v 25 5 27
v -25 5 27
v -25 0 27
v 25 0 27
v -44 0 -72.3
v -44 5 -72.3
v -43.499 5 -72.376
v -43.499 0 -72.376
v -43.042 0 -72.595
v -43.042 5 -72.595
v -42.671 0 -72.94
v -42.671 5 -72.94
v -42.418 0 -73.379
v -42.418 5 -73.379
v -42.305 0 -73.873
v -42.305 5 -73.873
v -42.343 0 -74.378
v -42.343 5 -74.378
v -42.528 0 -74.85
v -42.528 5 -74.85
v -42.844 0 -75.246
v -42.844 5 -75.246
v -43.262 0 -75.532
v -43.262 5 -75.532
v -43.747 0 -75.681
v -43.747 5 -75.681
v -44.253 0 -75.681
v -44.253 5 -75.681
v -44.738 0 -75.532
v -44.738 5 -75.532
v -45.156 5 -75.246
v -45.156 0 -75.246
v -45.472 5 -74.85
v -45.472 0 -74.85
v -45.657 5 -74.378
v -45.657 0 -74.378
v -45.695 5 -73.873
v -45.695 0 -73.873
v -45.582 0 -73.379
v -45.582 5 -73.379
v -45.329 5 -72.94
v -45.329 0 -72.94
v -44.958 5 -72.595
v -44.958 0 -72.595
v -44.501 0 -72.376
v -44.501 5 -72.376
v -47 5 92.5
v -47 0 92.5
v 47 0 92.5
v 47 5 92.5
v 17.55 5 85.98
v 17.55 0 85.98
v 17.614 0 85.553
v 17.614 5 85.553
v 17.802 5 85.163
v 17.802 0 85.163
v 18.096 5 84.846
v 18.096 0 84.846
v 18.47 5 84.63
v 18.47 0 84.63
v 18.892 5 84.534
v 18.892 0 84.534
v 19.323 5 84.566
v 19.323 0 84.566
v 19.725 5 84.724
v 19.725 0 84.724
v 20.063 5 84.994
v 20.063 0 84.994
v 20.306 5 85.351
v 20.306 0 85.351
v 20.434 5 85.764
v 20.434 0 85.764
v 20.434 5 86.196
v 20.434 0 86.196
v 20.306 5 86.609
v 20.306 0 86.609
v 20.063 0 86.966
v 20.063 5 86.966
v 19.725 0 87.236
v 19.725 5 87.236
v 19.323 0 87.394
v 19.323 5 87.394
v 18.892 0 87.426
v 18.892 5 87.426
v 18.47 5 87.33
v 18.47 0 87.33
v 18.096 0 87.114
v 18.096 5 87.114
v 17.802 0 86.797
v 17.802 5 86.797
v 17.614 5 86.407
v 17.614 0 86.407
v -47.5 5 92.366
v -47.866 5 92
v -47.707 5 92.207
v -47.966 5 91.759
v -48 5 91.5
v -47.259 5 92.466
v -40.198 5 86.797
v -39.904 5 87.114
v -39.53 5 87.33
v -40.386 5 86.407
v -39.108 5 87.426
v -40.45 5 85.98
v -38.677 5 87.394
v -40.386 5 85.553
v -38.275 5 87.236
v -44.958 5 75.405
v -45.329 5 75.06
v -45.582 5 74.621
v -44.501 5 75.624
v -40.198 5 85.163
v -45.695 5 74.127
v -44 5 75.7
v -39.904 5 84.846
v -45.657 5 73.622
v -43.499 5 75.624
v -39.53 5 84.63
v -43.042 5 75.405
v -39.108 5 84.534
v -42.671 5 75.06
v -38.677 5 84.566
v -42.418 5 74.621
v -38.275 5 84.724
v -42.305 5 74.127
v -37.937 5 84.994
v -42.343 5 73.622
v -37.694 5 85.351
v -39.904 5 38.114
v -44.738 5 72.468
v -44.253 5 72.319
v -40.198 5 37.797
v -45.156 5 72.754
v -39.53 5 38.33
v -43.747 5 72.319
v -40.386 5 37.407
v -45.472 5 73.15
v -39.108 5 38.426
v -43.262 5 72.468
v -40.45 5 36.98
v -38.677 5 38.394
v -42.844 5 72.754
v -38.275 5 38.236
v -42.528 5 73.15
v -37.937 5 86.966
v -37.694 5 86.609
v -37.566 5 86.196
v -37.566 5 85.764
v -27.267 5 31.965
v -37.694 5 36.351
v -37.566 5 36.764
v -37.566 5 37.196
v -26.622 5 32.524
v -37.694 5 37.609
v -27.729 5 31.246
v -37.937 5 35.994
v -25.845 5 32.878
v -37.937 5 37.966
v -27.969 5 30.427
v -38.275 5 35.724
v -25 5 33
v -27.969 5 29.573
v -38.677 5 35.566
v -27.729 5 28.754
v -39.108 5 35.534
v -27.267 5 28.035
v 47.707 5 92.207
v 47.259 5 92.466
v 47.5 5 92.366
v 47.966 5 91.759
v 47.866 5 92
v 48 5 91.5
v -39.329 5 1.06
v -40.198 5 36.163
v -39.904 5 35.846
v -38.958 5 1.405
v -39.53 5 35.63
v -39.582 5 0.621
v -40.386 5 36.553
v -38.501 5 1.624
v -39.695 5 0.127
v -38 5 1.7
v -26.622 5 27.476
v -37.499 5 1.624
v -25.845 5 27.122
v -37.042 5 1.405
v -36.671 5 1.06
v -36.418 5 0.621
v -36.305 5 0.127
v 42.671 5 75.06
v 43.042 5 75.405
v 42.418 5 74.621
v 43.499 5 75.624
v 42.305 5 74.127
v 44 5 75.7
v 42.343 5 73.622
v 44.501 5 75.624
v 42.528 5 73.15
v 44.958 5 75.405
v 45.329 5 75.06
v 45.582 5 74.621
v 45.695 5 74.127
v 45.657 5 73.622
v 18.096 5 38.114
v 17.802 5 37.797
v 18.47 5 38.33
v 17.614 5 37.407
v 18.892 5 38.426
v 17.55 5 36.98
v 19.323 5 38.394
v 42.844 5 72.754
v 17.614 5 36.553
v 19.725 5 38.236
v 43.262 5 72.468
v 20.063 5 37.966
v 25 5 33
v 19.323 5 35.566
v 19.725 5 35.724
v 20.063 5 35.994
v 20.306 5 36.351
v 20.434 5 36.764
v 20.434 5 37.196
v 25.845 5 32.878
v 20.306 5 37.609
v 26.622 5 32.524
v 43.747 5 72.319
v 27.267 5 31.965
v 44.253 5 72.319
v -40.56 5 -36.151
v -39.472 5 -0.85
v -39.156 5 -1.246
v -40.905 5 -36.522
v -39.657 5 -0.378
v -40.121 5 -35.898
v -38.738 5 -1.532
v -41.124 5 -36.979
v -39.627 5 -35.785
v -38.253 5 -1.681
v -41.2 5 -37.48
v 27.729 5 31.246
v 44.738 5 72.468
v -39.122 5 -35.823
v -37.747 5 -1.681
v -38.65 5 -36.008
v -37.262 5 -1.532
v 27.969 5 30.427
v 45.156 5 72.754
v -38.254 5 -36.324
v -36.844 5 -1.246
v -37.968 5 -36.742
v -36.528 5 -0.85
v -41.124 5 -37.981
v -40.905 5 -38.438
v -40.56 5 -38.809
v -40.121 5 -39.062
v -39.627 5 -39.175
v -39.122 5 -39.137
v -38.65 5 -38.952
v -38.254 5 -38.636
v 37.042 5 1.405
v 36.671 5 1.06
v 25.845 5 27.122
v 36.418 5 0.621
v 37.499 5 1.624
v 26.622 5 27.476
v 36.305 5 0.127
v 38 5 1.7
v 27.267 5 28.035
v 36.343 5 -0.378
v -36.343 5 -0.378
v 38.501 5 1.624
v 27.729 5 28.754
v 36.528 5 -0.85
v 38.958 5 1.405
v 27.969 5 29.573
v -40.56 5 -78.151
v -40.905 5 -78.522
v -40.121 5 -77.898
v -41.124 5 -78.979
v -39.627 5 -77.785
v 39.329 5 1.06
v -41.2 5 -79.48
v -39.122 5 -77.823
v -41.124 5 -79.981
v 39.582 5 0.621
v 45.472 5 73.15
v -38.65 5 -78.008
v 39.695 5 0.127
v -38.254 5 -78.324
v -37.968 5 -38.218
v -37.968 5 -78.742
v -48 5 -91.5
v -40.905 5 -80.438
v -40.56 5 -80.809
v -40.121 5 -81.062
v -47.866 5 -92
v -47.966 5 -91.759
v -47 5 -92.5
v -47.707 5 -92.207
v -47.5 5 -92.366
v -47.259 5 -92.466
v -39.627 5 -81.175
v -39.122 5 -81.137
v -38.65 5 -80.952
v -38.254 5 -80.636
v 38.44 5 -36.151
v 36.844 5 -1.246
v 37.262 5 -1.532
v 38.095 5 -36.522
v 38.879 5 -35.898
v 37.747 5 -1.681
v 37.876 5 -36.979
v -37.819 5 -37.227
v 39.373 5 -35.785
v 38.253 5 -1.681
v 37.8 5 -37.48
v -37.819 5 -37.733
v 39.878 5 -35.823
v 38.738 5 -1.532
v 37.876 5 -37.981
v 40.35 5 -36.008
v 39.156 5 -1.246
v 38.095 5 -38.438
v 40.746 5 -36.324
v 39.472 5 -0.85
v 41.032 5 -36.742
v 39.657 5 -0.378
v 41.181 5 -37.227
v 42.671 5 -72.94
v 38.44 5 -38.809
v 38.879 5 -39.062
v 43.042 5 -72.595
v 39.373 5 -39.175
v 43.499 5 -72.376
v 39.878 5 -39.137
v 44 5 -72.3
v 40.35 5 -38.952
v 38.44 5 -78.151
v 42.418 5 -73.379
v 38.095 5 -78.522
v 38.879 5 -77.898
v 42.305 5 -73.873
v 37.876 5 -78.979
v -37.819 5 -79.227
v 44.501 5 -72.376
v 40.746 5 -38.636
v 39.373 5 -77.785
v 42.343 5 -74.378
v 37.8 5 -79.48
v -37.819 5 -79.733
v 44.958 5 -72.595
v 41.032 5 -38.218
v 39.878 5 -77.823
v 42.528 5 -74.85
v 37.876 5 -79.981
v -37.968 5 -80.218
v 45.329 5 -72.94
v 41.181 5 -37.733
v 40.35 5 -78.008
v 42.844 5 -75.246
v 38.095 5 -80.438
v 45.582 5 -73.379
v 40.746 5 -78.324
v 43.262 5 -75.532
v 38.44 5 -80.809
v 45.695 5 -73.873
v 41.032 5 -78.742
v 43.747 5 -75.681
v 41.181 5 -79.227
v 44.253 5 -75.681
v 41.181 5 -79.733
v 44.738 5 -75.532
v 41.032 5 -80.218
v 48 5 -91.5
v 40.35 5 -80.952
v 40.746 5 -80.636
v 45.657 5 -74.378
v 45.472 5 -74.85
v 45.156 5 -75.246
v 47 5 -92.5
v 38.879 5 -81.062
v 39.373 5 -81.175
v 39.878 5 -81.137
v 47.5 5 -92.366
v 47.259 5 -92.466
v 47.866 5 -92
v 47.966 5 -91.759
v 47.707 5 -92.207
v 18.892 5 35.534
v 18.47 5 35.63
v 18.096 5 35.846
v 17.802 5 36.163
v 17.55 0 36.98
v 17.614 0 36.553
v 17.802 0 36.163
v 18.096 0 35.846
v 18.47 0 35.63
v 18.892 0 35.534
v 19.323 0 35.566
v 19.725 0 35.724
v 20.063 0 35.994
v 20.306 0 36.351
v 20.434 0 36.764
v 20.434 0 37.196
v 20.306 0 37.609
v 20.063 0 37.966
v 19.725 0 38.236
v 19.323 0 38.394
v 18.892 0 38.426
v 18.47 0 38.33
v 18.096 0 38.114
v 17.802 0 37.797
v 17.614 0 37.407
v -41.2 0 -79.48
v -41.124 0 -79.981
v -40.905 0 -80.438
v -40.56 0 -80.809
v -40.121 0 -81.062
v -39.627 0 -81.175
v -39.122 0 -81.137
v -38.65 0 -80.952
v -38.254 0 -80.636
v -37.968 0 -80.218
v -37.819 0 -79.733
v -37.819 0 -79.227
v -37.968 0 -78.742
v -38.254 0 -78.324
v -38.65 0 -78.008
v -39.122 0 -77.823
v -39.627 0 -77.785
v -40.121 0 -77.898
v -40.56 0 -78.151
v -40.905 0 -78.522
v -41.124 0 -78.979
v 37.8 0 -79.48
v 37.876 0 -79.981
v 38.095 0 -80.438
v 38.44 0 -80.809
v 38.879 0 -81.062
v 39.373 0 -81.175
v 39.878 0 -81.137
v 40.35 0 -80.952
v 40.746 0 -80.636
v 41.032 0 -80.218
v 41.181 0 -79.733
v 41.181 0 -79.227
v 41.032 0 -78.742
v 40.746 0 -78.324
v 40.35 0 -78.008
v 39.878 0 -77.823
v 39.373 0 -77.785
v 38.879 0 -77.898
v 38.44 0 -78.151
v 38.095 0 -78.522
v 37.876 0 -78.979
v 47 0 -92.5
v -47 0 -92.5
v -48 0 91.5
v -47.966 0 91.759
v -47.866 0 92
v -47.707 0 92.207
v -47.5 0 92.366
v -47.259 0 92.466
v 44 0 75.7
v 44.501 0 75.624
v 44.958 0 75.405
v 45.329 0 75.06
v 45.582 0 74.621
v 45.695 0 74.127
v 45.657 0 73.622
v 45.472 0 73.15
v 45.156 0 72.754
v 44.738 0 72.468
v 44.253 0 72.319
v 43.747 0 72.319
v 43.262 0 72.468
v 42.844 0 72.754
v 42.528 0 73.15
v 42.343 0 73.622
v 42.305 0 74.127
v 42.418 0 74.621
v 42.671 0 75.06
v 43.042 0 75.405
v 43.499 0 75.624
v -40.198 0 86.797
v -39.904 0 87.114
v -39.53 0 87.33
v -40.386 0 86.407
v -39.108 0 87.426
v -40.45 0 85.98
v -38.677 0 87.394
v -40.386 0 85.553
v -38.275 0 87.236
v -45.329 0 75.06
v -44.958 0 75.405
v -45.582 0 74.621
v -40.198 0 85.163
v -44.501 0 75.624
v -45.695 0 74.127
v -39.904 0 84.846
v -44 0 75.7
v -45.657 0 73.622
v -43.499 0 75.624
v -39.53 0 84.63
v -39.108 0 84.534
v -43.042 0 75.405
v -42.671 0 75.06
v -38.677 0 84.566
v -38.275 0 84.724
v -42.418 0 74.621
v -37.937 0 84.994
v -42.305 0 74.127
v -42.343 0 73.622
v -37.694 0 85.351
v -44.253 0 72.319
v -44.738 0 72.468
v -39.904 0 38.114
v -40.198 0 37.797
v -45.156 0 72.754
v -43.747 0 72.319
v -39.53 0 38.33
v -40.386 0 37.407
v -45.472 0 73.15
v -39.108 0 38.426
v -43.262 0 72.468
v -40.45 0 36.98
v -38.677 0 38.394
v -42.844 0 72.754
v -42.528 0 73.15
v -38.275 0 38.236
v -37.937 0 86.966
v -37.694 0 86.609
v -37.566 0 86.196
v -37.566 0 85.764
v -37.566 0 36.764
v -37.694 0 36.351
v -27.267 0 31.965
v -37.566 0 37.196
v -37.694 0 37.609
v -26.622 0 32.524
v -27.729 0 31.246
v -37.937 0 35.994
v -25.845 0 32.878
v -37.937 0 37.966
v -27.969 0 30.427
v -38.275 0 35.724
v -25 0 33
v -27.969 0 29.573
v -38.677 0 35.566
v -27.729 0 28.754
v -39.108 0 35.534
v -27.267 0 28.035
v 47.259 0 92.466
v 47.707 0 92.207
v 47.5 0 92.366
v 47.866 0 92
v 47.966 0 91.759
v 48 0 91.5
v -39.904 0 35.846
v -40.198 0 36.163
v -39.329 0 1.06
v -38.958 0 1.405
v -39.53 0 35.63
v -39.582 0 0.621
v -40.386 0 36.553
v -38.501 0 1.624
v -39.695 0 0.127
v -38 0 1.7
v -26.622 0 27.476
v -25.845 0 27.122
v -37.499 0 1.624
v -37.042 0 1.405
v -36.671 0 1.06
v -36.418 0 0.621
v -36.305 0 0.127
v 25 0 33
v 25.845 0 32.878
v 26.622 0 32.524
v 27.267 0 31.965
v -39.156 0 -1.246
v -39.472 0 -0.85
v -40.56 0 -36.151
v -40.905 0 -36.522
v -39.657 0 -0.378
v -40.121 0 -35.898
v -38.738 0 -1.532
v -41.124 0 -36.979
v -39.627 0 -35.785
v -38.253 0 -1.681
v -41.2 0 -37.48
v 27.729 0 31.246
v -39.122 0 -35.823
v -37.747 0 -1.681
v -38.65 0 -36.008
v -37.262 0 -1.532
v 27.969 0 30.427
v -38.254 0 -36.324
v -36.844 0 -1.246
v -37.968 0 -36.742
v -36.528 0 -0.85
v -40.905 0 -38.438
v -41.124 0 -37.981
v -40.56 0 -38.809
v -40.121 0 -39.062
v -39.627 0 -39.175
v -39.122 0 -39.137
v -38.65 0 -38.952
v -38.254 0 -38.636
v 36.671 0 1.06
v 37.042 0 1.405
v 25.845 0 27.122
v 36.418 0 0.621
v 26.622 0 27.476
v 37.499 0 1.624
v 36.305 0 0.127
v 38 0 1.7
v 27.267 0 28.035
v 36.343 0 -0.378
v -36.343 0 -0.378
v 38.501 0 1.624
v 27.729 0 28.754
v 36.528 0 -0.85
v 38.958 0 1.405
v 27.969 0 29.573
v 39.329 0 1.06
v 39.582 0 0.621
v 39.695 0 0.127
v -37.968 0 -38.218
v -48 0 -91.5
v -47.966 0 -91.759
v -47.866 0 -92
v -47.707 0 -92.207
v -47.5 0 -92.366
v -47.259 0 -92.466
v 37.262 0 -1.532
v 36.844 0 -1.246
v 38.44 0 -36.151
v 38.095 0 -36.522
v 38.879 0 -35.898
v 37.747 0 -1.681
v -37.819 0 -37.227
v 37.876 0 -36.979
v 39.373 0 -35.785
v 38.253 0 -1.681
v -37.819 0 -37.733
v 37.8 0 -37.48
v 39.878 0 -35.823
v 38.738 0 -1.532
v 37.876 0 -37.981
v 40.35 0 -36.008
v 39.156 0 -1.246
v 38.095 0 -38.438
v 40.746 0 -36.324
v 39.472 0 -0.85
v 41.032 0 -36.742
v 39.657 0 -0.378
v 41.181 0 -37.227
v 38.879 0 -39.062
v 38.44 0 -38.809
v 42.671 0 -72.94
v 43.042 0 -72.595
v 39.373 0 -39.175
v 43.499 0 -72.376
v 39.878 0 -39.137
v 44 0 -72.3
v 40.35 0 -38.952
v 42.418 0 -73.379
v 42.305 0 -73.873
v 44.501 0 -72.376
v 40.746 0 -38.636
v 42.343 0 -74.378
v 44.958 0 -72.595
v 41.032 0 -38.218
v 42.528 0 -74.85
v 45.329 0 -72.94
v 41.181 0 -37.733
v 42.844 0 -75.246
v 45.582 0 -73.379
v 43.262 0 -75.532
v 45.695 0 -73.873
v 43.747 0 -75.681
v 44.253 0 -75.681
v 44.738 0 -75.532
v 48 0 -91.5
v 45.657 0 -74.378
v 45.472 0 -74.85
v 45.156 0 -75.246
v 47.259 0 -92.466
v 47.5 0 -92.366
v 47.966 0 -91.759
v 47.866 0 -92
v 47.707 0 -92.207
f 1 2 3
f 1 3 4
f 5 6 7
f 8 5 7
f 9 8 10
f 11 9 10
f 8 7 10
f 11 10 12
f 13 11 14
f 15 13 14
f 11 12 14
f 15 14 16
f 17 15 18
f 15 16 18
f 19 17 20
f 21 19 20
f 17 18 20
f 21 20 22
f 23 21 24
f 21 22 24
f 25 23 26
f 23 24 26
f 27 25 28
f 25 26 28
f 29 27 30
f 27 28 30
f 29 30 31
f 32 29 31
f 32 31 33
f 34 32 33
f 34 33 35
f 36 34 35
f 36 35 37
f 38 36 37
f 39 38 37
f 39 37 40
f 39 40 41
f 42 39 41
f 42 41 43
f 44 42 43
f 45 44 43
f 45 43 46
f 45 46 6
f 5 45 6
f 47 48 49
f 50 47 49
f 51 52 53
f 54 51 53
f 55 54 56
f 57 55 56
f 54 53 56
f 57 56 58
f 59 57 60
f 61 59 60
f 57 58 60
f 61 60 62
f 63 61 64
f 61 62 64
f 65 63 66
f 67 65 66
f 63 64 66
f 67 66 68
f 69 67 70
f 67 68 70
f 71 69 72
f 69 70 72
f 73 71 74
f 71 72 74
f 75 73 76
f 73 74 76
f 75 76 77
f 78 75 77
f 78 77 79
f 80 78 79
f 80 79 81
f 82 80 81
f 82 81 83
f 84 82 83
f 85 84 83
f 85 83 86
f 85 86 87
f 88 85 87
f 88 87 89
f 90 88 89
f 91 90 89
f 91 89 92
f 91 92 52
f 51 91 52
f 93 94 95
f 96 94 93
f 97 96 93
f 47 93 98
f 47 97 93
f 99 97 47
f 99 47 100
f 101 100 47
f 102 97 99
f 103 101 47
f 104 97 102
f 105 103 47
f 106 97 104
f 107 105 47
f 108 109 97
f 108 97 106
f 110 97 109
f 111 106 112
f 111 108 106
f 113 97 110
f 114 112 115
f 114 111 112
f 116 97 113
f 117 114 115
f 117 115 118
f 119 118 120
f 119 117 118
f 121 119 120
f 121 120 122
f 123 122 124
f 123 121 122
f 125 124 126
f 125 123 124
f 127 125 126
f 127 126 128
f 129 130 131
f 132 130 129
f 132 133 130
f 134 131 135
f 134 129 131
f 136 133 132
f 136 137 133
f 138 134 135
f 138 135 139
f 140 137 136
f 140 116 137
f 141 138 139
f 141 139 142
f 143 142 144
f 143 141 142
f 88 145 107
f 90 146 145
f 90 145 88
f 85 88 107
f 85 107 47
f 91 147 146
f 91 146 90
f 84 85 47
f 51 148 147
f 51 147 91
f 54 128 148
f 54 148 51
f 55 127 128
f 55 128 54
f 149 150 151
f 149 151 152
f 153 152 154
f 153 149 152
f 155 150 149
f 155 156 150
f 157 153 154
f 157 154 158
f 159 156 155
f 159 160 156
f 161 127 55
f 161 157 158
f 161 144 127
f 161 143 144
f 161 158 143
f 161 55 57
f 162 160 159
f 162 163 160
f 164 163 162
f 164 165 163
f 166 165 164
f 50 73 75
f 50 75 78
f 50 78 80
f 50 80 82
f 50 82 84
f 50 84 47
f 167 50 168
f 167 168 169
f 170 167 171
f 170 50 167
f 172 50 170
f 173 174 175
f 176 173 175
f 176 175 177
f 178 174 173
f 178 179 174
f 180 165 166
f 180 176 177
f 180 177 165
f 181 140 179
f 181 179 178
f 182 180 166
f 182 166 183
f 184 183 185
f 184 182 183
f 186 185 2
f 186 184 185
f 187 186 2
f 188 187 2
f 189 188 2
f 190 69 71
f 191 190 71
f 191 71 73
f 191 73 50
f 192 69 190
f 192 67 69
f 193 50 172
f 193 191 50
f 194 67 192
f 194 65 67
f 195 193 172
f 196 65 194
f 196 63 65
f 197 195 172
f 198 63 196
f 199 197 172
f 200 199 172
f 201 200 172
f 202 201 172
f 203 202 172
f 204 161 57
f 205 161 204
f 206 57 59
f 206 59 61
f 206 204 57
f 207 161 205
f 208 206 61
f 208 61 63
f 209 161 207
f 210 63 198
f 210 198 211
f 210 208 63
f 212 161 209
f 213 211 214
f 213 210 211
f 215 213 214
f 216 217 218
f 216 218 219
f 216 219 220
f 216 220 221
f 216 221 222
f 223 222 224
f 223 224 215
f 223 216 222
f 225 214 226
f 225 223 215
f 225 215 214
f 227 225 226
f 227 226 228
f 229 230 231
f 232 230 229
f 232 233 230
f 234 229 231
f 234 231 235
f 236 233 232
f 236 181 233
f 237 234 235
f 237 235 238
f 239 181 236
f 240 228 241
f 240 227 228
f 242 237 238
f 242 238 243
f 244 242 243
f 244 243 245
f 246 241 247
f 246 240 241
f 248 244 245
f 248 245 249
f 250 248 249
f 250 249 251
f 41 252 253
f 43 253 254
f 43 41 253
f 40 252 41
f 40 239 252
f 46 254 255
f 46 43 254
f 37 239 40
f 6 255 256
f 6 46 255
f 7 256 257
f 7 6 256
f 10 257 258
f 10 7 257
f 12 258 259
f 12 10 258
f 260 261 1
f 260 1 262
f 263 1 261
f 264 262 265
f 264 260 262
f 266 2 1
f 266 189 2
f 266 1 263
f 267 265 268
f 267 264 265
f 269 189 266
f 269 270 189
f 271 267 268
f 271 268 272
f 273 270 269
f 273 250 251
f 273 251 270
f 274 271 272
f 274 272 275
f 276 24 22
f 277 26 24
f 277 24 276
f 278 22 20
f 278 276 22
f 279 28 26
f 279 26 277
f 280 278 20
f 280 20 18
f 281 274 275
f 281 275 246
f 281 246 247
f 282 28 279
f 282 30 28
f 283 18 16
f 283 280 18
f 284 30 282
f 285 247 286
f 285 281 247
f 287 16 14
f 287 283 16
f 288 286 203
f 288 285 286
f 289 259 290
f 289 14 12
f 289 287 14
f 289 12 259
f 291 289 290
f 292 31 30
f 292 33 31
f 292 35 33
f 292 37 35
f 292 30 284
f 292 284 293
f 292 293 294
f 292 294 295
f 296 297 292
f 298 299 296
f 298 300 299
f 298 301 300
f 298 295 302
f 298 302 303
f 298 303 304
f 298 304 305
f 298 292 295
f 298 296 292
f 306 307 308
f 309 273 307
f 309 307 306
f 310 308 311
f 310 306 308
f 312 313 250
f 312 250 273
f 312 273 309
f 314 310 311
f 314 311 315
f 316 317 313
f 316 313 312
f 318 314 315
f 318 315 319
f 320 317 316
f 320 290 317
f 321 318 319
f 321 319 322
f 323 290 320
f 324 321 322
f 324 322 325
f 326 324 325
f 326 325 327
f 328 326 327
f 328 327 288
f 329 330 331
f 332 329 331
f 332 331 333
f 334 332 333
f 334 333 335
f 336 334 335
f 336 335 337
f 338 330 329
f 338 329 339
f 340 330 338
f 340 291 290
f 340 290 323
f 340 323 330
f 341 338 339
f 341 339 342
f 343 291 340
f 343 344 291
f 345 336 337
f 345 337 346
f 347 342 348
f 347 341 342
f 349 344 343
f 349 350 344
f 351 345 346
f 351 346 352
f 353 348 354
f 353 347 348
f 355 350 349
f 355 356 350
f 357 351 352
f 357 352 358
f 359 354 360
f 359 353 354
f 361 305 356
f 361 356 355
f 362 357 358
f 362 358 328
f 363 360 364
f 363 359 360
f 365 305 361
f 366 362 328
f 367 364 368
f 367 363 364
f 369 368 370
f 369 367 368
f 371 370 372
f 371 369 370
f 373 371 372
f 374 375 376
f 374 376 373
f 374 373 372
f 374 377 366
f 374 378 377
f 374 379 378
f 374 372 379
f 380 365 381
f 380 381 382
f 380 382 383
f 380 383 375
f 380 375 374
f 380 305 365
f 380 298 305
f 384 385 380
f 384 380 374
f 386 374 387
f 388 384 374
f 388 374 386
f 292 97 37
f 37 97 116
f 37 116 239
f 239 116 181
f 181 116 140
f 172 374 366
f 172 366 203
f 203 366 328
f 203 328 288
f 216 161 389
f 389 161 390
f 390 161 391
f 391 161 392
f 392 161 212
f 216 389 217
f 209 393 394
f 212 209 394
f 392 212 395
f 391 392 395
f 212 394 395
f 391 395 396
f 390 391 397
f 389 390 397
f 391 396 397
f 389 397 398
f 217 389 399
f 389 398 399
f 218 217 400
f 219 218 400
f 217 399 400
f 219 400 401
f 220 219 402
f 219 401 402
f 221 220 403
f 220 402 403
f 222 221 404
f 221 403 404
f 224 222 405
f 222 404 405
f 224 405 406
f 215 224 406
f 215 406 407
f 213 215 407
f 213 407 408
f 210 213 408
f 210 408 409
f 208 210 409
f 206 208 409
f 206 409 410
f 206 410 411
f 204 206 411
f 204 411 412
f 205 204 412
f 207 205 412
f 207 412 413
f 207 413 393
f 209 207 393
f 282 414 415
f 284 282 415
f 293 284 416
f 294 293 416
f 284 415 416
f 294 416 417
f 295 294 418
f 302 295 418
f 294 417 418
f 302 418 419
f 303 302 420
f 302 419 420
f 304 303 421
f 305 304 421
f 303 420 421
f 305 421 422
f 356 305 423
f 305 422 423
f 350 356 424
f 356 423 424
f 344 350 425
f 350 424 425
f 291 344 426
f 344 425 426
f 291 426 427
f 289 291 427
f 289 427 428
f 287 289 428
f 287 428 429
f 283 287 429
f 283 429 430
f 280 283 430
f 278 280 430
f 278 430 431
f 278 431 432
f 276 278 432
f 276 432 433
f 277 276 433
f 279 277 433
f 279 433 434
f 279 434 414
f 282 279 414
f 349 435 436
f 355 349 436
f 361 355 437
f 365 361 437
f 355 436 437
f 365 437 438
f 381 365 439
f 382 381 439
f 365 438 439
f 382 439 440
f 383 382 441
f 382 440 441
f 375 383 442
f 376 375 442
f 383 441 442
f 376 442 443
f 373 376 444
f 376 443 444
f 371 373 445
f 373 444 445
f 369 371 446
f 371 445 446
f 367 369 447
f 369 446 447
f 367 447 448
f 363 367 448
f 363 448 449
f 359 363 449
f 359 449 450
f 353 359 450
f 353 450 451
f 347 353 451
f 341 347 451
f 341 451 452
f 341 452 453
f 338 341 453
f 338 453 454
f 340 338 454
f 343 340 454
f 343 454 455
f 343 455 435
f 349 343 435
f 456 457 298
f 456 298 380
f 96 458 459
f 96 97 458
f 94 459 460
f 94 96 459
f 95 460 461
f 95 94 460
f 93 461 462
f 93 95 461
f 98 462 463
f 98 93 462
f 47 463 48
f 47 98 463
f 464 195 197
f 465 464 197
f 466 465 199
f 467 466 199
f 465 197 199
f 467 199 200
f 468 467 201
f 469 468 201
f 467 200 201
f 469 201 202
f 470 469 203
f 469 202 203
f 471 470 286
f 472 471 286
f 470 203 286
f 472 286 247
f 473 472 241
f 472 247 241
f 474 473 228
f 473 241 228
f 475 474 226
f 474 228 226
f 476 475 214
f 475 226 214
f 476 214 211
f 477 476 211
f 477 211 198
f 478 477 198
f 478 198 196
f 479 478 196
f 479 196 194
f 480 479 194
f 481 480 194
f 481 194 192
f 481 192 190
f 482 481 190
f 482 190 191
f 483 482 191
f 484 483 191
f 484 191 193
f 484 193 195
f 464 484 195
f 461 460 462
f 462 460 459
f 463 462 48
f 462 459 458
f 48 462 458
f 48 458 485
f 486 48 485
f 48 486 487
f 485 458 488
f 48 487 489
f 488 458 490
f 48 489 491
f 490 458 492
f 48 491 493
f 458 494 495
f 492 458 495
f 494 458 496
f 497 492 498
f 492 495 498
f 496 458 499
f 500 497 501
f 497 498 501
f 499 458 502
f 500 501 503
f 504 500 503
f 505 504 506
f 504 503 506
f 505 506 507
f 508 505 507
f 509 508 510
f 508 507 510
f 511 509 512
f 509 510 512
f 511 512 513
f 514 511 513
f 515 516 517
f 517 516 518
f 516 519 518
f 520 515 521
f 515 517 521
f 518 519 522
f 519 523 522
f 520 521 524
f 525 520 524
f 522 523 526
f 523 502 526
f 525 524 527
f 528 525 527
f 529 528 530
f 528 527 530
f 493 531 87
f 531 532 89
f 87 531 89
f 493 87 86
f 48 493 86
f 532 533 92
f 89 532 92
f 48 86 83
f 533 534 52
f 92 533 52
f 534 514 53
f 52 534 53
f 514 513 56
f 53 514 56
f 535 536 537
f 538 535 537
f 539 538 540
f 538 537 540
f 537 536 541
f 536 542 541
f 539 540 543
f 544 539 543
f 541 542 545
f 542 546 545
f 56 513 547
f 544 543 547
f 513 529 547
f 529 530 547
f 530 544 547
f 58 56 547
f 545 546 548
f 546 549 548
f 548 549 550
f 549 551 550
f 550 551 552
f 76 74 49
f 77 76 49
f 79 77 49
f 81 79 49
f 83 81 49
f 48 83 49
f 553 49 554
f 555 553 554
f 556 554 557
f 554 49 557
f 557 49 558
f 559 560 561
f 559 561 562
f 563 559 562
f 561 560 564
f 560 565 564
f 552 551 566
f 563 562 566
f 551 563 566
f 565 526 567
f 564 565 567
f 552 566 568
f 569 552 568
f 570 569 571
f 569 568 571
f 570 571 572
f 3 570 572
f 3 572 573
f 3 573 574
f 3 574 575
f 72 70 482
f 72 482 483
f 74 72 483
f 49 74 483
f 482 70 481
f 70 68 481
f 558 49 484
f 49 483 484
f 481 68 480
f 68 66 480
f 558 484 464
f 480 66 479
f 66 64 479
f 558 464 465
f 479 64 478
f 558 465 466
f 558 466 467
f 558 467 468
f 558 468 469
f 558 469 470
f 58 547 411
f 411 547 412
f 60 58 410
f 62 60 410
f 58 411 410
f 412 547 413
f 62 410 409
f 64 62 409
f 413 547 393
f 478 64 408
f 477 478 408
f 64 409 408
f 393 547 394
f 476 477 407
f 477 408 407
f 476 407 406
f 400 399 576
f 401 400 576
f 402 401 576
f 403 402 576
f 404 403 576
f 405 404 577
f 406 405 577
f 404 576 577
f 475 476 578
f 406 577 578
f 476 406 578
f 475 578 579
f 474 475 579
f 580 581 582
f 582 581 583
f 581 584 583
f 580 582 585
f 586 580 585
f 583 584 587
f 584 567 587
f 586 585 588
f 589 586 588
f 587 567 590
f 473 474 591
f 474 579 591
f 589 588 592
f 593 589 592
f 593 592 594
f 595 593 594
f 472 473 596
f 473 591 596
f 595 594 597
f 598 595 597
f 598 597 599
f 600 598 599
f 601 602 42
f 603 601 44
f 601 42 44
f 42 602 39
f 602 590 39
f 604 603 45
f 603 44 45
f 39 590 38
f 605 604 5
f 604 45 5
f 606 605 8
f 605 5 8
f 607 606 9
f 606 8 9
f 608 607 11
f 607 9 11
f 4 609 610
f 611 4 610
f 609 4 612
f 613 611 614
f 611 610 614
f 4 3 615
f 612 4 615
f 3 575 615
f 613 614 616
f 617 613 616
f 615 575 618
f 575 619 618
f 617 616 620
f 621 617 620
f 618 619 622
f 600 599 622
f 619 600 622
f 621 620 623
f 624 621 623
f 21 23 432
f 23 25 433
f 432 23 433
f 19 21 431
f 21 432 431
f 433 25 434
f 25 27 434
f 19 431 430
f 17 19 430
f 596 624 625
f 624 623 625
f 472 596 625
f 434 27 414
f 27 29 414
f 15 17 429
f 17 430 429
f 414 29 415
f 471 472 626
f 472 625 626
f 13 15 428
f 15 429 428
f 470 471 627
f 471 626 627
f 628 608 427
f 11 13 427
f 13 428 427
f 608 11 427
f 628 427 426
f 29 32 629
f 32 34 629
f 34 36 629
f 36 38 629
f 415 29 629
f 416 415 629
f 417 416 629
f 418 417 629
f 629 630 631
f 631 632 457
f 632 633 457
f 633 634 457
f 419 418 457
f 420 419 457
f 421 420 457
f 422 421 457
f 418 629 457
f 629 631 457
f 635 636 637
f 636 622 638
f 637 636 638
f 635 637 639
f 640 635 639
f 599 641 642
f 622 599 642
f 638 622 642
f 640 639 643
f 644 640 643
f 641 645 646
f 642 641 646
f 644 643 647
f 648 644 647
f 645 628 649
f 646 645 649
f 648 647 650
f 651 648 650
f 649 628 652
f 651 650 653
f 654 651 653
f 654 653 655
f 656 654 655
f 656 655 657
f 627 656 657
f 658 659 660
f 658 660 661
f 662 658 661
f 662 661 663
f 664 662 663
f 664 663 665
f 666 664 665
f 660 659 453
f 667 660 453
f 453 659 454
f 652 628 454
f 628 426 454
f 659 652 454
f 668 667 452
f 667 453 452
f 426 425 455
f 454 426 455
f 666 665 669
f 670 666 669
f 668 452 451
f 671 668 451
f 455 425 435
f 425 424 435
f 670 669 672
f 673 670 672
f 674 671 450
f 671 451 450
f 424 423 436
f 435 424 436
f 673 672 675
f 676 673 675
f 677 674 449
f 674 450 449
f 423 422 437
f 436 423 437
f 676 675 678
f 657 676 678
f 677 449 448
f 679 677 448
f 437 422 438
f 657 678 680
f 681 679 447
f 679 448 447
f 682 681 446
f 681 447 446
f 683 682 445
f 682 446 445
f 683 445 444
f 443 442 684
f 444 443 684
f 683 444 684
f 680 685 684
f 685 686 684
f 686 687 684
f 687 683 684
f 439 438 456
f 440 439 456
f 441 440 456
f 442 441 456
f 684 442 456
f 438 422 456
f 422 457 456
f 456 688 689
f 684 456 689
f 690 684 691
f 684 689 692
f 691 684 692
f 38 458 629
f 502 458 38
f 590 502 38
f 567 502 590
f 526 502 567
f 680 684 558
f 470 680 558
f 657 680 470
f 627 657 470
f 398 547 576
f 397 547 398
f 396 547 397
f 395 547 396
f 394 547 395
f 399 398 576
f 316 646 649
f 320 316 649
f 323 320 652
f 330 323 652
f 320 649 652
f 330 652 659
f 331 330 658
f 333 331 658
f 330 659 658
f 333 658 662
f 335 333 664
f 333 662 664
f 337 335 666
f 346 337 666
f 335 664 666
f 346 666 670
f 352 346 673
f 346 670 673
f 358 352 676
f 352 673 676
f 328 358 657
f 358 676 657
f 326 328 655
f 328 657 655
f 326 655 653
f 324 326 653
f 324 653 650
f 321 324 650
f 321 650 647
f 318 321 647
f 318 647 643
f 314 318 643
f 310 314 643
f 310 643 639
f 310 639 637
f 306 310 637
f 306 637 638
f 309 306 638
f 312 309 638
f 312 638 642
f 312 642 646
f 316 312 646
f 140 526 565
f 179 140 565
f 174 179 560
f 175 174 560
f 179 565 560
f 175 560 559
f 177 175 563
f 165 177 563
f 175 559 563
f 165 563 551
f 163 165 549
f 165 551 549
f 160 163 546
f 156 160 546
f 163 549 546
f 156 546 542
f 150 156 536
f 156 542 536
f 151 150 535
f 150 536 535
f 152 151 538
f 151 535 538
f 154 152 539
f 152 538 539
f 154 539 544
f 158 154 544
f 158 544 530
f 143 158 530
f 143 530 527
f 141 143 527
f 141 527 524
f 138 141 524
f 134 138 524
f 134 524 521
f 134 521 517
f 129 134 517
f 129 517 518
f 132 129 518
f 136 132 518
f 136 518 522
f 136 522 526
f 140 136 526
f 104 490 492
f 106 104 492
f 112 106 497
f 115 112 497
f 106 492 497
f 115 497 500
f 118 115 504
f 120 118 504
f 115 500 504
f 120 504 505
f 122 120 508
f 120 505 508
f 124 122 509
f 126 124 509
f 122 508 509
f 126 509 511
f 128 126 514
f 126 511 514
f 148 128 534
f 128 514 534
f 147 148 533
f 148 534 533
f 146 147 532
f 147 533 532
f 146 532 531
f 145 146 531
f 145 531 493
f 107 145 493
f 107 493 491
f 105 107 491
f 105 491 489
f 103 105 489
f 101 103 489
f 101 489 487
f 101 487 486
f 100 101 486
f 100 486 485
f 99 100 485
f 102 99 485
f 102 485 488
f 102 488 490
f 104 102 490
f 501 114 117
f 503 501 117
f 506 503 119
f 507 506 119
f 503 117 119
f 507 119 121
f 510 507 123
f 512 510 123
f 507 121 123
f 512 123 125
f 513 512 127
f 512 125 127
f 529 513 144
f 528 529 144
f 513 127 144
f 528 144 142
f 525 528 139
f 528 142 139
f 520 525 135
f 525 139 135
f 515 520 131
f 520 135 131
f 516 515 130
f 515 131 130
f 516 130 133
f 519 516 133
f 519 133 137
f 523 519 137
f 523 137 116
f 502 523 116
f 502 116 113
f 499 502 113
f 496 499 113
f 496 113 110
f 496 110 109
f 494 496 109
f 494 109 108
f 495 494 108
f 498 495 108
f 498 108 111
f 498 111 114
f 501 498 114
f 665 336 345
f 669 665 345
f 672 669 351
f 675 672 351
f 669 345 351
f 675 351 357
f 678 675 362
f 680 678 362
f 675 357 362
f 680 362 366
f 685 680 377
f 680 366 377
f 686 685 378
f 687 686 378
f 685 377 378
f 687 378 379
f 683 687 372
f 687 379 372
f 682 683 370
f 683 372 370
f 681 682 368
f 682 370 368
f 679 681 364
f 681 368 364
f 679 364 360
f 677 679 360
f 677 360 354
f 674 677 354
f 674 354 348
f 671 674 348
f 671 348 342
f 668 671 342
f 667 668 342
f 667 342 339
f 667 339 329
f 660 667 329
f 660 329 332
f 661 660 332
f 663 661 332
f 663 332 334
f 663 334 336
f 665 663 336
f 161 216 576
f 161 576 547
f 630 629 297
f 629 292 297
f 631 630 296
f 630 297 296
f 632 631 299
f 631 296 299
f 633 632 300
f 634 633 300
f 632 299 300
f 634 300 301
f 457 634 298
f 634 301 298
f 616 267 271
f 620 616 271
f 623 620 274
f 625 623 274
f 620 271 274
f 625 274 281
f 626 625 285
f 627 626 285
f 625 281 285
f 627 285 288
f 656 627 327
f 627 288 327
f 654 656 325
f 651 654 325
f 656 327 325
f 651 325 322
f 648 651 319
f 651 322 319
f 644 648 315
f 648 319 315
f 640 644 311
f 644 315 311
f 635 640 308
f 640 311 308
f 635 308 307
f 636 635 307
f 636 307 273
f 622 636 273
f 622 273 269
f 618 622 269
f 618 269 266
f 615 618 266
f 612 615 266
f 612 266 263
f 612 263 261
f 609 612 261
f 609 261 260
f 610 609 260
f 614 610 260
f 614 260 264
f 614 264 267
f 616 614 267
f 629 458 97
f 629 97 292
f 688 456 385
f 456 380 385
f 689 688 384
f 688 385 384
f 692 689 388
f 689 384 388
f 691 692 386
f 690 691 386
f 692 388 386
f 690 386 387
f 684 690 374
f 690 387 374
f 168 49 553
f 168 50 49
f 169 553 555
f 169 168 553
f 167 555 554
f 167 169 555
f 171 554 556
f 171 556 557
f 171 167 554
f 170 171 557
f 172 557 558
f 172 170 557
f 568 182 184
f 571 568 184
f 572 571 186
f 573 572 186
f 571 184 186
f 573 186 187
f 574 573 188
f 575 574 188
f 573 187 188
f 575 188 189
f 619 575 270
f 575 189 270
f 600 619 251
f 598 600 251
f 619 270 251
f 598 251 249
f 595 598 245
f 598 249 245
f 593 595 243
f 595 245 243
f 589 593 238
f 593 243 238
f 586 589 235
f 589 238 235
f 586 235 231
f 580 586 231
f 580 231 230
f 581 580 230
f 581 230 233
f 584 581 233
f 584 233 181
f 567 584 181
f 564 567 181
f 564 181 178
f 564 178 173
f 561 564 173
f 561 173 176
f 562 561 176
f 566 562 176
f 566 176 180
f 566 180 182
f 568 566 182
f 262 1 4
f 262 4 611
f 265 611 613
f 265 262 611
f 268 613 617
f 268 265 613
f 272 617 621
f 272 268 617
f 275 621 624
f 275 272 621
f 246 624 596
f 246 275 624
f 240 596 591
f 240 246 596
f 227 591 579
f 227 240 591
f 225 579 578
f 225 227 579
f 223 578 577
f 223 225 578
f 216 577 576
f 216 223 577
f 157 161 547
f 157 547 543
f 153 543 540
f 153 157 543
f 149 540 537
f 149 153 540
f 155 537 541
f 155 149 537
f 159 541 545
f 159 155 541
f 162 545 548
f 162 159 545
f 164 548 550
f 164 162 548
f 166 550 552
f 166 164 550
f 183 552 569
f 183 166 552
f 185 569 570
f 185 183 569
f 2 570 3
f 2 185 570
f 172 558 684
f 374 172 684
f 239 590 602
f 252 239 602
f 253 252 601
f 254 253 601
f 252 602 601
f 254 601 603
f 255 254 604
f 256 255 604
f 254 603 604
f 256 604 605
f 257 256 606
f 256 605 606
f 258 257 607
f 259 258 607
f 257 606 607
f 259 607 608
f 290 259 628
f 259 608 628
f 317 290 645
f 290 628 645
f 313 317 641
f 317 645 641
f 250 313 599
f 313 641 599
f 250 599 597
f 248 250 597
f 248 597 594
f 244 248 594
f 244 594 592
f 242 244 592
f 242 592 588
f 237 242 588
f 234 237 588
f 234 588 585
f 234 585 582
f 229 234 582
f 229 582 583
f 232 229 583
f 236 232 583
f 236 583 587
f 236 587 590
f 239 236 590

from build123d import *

# Parameters (mm, degrees)
SKETCH1_W               = 96
SKETCH1_H               = 185
PLATE_DEPTH             = 5
STANDOFF_HOLES_REACH    = 106.332
SKETCH2_R               = 1.7
POWER_BOARD_HOLES_REACH = 106.332
SKETCH3_R               = 1.7
FILLET1_R               = 1
M2_5_CLEARANCE_HOLE1_D  = 2.9
M3_CLEARANCE_HOLE2_D    = 3.4
CUT_EXTRUDE1_REACH      = 106.332


with BuildPart() as part:
    # Sketch1 → plate (new body)
    with BuildSketch(Plane(origin=(0, 0, 0), x_dir=(1, 0, 0), z_dir=(0, 1, 0))):
        Rectangle(SKETCH1_W, SKETCH1_H)
    extrude(amount=PLATE_DEPTH)

    # Sketch2 → standoff-holes (cut, up to next)
    with BuildSketch(Plane(origin=(0, 5, 0), x_dir=(1, 0, 0), z_dir=(0, 1, 0)), mode=Mode.PRIVATE) as standoff_holes_sk1:
        with Locations(Location((44, 74, 0), (0, 0, 270))):
            Circle(SKETCH2_R)
    standoff_holes_tool1 = extrude(standoff_holes_sk1.sketch, amount=-STANDOFF_HOLES_REACH, mode=Mode.PRIVATE) & part.part
    # Sketch2 → standoff-holes (cut, up to next)
    with BuildSketch(Plane(origin=(0, 5, 0), x_dir=(1, 0, 0), z_dir=(0, 1, 0)), mode=Mode.PRIVATE) as standoff_holes_sk2:
        with Locations(Location((-44, 74, 0), (0, 0, 270))):
            Circle(SKETCH2_R)
    standoff_holes_tool2 = extrude(standoff_holes_sk2.sketch, amount=-STANDOFF_HOLES_REACH, mode=Mode.PRIVATE) & part.part
    # Sketch2 → standoff-holes (cut, up to next)
    with BuildSketch(Plane(origin=(0, 5, 0), x_dir=(1, 0, 0), z_dir=(0, 1, 0)), mode=Mode.PRIVATE) as standoff_holes_sk3:
        with Locations(Location((44, -74, 0), (0, 0, 270))):
            Circle(SKETCH2_R)
    standoff_holes_tool3 = extrude(standoff_holes_sk3.sketch, amount=-STANDOFF_HOLES_REACH, mode=Mode.PRIVATE) & part.part
    # Sketch2 → standoff-holes (cut, up to next)
    with BuildSketch(Plane(origin=(0, 5, 0), x_dir=(1, 0, 0), z_dir=(0, 1, 0)), mode=Mode.PRIVATE) as standoff_holes_sk4:
        with Locations(Location((-44, -74, 0), (0, 0, 270))):
            Circle(SKETCH2_R)
    standoff_holes_tool4 = extrude(standoff_holes_sk4.sketch, amount=-STANDOFF_HOLES_REACH, mode=Mode.PRIVATE) & part.part
    add(standoff_holes_tool1.solids().sort_by_distance((44, 5, -74))[0], mode=Mode.SUBTRACT)
    add(standoff_holes_tool2.solids().sort_by_distance((-44, 5, -74))[0], mode=Mode.SUBTRACT)
    add(standoff_holes_tool3.solids().sort_by_distance((44, 5, 74))[0], mode=Mode.SUBTRACT)
    add(standoff_holes_tool4.solids().sort_by_distance((-44, 5, 74))[0], mode=Mode.SUBTRACT)

    # Sketch3 → power-board-holes (cut, up to next)
    with BuildSketch(Plane(origin=(0, 5, 0), x_dir=(1, 0, 0), z_dir=(0, 1, 0)), mode=Mode.PRIVATE) as power_board_holes_sk1:
        with Locations(Location((38, 0, 0), (0, 0, 270))):
            Circle(SKETCH3_R)
    power_board_holes_tool1 = extrude(power_board_holes_sk1.sketch, amount=-POWER_BOARD_HOLES_REACH, mode=Mode.PRIVATE) & part.part
    # Sketch3 → power-board-holes (cut, up to next)
    with BuildSketch(Plane(origin=(0, 5, 0), x_dir=(1, 0, 0), z_dir=(0, 1, 0)), mode=Mode.PRIVATE) as power_board_holes_sk2:
        with Locations(Location((-38, 0, 0), (0, 0, 270))):
            Circle(SKETCH3_R)
    power_board_holes_tool2 = extrude(power_board_holes_sk2.sketch, amount=-POWER_BOARD_HOLES_REACH, mode=Mode.PRIVATE) & part.part
    add(power_board_holes_tool1.solids().sort_by_distance((38, 5, 0))[0], mode=Mode.SUBTRACT)
    add(power_board_holes_tool2.solids().sort_by_distance((-38, 5, 0))[0], mode=Mode.SUBTRACT)

    # Fillet1
    fillet1_edges = [part.edges().sort_by_distance(p)[0] for p in [
        (48, 2.5, 92.5),
        (-48, 2.5, 92.5),
        (-48, 2.5, -92.5),
        (48, 2.5, -92.5),
    ]]
    fillet(fillet1_edges, radius=FILLET1_R)

    # M2.5 Clearance Hole1 (through all)
    with Locations(Plane(origin=(0, 5, 0), x_dir=(1, 0, 0), z_dir=(0, 1, 0))):
        with Locations((-39, -85.98), (19, -85.98), (-39, -36.98), (19, -36.98)):
            Hole(M2_5_CLEARANCE_HOLE1_D / 2)

    # M3 Clearance Hole2 (through all)
    with Locations(Plane(origin=(0, 5, 0), x_dir=(1, 0, 0), z_dir=(0, 1, 0))):
        with Locations((-39.49999847, 79.47999944), (-39.49999847, 37.47999962), (39.50000101, 37.47999962), (39.50000101, 79.47999944)):
            Hole(M3_CLEARANCE_HOLE2_D / 2)

    # Sketch12 → Cut-Extrude1 (cut, up to next)
    with BuildSketch(Plane(origin=(0, 5, 0), x_dir=(1, 0, 0), z_dir=(0, 1, 0)), mode=Mode.PRIVATE) as cut_extrude1_sk1:
        with BuildLine():
            Line((-25, -27), (25, -27))
            ThreePointArc((25, -27), (28, -30), (25, -33))
            Line((25, -33), (-25, -33))
            ThreePointArc((-25, -33), (-28, -30), (-25, -27))
        make_face()
    cut_extrude1_tool1 = extrude(cut_extrude1_sk1.sketch, amount=-CUT_EXTRUDE1_REACH, mode=Mode.PRIVATE) & part.part
    add(cut_extrude1_tool1.solids().sort_by_distance((0, 5, 30))[0], mode=Mode.SUBTRACT)


solid = part.part
